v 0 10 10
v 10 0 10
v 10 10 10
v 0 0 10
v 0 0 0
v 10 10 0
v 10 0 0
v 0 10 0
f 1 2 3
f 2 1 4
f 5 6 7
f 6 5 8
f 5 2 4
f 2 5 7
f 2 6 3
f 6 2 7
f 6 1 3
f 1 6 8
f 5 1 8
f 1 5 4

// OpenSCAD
// Console fidelity fixture: echoes a marker so the console log has
// observable per-render content.

/*[Dimensions]*/
size = 10; // [5:50]

echo("fidelity-marker size=", size);

cube([size, size, size]);
